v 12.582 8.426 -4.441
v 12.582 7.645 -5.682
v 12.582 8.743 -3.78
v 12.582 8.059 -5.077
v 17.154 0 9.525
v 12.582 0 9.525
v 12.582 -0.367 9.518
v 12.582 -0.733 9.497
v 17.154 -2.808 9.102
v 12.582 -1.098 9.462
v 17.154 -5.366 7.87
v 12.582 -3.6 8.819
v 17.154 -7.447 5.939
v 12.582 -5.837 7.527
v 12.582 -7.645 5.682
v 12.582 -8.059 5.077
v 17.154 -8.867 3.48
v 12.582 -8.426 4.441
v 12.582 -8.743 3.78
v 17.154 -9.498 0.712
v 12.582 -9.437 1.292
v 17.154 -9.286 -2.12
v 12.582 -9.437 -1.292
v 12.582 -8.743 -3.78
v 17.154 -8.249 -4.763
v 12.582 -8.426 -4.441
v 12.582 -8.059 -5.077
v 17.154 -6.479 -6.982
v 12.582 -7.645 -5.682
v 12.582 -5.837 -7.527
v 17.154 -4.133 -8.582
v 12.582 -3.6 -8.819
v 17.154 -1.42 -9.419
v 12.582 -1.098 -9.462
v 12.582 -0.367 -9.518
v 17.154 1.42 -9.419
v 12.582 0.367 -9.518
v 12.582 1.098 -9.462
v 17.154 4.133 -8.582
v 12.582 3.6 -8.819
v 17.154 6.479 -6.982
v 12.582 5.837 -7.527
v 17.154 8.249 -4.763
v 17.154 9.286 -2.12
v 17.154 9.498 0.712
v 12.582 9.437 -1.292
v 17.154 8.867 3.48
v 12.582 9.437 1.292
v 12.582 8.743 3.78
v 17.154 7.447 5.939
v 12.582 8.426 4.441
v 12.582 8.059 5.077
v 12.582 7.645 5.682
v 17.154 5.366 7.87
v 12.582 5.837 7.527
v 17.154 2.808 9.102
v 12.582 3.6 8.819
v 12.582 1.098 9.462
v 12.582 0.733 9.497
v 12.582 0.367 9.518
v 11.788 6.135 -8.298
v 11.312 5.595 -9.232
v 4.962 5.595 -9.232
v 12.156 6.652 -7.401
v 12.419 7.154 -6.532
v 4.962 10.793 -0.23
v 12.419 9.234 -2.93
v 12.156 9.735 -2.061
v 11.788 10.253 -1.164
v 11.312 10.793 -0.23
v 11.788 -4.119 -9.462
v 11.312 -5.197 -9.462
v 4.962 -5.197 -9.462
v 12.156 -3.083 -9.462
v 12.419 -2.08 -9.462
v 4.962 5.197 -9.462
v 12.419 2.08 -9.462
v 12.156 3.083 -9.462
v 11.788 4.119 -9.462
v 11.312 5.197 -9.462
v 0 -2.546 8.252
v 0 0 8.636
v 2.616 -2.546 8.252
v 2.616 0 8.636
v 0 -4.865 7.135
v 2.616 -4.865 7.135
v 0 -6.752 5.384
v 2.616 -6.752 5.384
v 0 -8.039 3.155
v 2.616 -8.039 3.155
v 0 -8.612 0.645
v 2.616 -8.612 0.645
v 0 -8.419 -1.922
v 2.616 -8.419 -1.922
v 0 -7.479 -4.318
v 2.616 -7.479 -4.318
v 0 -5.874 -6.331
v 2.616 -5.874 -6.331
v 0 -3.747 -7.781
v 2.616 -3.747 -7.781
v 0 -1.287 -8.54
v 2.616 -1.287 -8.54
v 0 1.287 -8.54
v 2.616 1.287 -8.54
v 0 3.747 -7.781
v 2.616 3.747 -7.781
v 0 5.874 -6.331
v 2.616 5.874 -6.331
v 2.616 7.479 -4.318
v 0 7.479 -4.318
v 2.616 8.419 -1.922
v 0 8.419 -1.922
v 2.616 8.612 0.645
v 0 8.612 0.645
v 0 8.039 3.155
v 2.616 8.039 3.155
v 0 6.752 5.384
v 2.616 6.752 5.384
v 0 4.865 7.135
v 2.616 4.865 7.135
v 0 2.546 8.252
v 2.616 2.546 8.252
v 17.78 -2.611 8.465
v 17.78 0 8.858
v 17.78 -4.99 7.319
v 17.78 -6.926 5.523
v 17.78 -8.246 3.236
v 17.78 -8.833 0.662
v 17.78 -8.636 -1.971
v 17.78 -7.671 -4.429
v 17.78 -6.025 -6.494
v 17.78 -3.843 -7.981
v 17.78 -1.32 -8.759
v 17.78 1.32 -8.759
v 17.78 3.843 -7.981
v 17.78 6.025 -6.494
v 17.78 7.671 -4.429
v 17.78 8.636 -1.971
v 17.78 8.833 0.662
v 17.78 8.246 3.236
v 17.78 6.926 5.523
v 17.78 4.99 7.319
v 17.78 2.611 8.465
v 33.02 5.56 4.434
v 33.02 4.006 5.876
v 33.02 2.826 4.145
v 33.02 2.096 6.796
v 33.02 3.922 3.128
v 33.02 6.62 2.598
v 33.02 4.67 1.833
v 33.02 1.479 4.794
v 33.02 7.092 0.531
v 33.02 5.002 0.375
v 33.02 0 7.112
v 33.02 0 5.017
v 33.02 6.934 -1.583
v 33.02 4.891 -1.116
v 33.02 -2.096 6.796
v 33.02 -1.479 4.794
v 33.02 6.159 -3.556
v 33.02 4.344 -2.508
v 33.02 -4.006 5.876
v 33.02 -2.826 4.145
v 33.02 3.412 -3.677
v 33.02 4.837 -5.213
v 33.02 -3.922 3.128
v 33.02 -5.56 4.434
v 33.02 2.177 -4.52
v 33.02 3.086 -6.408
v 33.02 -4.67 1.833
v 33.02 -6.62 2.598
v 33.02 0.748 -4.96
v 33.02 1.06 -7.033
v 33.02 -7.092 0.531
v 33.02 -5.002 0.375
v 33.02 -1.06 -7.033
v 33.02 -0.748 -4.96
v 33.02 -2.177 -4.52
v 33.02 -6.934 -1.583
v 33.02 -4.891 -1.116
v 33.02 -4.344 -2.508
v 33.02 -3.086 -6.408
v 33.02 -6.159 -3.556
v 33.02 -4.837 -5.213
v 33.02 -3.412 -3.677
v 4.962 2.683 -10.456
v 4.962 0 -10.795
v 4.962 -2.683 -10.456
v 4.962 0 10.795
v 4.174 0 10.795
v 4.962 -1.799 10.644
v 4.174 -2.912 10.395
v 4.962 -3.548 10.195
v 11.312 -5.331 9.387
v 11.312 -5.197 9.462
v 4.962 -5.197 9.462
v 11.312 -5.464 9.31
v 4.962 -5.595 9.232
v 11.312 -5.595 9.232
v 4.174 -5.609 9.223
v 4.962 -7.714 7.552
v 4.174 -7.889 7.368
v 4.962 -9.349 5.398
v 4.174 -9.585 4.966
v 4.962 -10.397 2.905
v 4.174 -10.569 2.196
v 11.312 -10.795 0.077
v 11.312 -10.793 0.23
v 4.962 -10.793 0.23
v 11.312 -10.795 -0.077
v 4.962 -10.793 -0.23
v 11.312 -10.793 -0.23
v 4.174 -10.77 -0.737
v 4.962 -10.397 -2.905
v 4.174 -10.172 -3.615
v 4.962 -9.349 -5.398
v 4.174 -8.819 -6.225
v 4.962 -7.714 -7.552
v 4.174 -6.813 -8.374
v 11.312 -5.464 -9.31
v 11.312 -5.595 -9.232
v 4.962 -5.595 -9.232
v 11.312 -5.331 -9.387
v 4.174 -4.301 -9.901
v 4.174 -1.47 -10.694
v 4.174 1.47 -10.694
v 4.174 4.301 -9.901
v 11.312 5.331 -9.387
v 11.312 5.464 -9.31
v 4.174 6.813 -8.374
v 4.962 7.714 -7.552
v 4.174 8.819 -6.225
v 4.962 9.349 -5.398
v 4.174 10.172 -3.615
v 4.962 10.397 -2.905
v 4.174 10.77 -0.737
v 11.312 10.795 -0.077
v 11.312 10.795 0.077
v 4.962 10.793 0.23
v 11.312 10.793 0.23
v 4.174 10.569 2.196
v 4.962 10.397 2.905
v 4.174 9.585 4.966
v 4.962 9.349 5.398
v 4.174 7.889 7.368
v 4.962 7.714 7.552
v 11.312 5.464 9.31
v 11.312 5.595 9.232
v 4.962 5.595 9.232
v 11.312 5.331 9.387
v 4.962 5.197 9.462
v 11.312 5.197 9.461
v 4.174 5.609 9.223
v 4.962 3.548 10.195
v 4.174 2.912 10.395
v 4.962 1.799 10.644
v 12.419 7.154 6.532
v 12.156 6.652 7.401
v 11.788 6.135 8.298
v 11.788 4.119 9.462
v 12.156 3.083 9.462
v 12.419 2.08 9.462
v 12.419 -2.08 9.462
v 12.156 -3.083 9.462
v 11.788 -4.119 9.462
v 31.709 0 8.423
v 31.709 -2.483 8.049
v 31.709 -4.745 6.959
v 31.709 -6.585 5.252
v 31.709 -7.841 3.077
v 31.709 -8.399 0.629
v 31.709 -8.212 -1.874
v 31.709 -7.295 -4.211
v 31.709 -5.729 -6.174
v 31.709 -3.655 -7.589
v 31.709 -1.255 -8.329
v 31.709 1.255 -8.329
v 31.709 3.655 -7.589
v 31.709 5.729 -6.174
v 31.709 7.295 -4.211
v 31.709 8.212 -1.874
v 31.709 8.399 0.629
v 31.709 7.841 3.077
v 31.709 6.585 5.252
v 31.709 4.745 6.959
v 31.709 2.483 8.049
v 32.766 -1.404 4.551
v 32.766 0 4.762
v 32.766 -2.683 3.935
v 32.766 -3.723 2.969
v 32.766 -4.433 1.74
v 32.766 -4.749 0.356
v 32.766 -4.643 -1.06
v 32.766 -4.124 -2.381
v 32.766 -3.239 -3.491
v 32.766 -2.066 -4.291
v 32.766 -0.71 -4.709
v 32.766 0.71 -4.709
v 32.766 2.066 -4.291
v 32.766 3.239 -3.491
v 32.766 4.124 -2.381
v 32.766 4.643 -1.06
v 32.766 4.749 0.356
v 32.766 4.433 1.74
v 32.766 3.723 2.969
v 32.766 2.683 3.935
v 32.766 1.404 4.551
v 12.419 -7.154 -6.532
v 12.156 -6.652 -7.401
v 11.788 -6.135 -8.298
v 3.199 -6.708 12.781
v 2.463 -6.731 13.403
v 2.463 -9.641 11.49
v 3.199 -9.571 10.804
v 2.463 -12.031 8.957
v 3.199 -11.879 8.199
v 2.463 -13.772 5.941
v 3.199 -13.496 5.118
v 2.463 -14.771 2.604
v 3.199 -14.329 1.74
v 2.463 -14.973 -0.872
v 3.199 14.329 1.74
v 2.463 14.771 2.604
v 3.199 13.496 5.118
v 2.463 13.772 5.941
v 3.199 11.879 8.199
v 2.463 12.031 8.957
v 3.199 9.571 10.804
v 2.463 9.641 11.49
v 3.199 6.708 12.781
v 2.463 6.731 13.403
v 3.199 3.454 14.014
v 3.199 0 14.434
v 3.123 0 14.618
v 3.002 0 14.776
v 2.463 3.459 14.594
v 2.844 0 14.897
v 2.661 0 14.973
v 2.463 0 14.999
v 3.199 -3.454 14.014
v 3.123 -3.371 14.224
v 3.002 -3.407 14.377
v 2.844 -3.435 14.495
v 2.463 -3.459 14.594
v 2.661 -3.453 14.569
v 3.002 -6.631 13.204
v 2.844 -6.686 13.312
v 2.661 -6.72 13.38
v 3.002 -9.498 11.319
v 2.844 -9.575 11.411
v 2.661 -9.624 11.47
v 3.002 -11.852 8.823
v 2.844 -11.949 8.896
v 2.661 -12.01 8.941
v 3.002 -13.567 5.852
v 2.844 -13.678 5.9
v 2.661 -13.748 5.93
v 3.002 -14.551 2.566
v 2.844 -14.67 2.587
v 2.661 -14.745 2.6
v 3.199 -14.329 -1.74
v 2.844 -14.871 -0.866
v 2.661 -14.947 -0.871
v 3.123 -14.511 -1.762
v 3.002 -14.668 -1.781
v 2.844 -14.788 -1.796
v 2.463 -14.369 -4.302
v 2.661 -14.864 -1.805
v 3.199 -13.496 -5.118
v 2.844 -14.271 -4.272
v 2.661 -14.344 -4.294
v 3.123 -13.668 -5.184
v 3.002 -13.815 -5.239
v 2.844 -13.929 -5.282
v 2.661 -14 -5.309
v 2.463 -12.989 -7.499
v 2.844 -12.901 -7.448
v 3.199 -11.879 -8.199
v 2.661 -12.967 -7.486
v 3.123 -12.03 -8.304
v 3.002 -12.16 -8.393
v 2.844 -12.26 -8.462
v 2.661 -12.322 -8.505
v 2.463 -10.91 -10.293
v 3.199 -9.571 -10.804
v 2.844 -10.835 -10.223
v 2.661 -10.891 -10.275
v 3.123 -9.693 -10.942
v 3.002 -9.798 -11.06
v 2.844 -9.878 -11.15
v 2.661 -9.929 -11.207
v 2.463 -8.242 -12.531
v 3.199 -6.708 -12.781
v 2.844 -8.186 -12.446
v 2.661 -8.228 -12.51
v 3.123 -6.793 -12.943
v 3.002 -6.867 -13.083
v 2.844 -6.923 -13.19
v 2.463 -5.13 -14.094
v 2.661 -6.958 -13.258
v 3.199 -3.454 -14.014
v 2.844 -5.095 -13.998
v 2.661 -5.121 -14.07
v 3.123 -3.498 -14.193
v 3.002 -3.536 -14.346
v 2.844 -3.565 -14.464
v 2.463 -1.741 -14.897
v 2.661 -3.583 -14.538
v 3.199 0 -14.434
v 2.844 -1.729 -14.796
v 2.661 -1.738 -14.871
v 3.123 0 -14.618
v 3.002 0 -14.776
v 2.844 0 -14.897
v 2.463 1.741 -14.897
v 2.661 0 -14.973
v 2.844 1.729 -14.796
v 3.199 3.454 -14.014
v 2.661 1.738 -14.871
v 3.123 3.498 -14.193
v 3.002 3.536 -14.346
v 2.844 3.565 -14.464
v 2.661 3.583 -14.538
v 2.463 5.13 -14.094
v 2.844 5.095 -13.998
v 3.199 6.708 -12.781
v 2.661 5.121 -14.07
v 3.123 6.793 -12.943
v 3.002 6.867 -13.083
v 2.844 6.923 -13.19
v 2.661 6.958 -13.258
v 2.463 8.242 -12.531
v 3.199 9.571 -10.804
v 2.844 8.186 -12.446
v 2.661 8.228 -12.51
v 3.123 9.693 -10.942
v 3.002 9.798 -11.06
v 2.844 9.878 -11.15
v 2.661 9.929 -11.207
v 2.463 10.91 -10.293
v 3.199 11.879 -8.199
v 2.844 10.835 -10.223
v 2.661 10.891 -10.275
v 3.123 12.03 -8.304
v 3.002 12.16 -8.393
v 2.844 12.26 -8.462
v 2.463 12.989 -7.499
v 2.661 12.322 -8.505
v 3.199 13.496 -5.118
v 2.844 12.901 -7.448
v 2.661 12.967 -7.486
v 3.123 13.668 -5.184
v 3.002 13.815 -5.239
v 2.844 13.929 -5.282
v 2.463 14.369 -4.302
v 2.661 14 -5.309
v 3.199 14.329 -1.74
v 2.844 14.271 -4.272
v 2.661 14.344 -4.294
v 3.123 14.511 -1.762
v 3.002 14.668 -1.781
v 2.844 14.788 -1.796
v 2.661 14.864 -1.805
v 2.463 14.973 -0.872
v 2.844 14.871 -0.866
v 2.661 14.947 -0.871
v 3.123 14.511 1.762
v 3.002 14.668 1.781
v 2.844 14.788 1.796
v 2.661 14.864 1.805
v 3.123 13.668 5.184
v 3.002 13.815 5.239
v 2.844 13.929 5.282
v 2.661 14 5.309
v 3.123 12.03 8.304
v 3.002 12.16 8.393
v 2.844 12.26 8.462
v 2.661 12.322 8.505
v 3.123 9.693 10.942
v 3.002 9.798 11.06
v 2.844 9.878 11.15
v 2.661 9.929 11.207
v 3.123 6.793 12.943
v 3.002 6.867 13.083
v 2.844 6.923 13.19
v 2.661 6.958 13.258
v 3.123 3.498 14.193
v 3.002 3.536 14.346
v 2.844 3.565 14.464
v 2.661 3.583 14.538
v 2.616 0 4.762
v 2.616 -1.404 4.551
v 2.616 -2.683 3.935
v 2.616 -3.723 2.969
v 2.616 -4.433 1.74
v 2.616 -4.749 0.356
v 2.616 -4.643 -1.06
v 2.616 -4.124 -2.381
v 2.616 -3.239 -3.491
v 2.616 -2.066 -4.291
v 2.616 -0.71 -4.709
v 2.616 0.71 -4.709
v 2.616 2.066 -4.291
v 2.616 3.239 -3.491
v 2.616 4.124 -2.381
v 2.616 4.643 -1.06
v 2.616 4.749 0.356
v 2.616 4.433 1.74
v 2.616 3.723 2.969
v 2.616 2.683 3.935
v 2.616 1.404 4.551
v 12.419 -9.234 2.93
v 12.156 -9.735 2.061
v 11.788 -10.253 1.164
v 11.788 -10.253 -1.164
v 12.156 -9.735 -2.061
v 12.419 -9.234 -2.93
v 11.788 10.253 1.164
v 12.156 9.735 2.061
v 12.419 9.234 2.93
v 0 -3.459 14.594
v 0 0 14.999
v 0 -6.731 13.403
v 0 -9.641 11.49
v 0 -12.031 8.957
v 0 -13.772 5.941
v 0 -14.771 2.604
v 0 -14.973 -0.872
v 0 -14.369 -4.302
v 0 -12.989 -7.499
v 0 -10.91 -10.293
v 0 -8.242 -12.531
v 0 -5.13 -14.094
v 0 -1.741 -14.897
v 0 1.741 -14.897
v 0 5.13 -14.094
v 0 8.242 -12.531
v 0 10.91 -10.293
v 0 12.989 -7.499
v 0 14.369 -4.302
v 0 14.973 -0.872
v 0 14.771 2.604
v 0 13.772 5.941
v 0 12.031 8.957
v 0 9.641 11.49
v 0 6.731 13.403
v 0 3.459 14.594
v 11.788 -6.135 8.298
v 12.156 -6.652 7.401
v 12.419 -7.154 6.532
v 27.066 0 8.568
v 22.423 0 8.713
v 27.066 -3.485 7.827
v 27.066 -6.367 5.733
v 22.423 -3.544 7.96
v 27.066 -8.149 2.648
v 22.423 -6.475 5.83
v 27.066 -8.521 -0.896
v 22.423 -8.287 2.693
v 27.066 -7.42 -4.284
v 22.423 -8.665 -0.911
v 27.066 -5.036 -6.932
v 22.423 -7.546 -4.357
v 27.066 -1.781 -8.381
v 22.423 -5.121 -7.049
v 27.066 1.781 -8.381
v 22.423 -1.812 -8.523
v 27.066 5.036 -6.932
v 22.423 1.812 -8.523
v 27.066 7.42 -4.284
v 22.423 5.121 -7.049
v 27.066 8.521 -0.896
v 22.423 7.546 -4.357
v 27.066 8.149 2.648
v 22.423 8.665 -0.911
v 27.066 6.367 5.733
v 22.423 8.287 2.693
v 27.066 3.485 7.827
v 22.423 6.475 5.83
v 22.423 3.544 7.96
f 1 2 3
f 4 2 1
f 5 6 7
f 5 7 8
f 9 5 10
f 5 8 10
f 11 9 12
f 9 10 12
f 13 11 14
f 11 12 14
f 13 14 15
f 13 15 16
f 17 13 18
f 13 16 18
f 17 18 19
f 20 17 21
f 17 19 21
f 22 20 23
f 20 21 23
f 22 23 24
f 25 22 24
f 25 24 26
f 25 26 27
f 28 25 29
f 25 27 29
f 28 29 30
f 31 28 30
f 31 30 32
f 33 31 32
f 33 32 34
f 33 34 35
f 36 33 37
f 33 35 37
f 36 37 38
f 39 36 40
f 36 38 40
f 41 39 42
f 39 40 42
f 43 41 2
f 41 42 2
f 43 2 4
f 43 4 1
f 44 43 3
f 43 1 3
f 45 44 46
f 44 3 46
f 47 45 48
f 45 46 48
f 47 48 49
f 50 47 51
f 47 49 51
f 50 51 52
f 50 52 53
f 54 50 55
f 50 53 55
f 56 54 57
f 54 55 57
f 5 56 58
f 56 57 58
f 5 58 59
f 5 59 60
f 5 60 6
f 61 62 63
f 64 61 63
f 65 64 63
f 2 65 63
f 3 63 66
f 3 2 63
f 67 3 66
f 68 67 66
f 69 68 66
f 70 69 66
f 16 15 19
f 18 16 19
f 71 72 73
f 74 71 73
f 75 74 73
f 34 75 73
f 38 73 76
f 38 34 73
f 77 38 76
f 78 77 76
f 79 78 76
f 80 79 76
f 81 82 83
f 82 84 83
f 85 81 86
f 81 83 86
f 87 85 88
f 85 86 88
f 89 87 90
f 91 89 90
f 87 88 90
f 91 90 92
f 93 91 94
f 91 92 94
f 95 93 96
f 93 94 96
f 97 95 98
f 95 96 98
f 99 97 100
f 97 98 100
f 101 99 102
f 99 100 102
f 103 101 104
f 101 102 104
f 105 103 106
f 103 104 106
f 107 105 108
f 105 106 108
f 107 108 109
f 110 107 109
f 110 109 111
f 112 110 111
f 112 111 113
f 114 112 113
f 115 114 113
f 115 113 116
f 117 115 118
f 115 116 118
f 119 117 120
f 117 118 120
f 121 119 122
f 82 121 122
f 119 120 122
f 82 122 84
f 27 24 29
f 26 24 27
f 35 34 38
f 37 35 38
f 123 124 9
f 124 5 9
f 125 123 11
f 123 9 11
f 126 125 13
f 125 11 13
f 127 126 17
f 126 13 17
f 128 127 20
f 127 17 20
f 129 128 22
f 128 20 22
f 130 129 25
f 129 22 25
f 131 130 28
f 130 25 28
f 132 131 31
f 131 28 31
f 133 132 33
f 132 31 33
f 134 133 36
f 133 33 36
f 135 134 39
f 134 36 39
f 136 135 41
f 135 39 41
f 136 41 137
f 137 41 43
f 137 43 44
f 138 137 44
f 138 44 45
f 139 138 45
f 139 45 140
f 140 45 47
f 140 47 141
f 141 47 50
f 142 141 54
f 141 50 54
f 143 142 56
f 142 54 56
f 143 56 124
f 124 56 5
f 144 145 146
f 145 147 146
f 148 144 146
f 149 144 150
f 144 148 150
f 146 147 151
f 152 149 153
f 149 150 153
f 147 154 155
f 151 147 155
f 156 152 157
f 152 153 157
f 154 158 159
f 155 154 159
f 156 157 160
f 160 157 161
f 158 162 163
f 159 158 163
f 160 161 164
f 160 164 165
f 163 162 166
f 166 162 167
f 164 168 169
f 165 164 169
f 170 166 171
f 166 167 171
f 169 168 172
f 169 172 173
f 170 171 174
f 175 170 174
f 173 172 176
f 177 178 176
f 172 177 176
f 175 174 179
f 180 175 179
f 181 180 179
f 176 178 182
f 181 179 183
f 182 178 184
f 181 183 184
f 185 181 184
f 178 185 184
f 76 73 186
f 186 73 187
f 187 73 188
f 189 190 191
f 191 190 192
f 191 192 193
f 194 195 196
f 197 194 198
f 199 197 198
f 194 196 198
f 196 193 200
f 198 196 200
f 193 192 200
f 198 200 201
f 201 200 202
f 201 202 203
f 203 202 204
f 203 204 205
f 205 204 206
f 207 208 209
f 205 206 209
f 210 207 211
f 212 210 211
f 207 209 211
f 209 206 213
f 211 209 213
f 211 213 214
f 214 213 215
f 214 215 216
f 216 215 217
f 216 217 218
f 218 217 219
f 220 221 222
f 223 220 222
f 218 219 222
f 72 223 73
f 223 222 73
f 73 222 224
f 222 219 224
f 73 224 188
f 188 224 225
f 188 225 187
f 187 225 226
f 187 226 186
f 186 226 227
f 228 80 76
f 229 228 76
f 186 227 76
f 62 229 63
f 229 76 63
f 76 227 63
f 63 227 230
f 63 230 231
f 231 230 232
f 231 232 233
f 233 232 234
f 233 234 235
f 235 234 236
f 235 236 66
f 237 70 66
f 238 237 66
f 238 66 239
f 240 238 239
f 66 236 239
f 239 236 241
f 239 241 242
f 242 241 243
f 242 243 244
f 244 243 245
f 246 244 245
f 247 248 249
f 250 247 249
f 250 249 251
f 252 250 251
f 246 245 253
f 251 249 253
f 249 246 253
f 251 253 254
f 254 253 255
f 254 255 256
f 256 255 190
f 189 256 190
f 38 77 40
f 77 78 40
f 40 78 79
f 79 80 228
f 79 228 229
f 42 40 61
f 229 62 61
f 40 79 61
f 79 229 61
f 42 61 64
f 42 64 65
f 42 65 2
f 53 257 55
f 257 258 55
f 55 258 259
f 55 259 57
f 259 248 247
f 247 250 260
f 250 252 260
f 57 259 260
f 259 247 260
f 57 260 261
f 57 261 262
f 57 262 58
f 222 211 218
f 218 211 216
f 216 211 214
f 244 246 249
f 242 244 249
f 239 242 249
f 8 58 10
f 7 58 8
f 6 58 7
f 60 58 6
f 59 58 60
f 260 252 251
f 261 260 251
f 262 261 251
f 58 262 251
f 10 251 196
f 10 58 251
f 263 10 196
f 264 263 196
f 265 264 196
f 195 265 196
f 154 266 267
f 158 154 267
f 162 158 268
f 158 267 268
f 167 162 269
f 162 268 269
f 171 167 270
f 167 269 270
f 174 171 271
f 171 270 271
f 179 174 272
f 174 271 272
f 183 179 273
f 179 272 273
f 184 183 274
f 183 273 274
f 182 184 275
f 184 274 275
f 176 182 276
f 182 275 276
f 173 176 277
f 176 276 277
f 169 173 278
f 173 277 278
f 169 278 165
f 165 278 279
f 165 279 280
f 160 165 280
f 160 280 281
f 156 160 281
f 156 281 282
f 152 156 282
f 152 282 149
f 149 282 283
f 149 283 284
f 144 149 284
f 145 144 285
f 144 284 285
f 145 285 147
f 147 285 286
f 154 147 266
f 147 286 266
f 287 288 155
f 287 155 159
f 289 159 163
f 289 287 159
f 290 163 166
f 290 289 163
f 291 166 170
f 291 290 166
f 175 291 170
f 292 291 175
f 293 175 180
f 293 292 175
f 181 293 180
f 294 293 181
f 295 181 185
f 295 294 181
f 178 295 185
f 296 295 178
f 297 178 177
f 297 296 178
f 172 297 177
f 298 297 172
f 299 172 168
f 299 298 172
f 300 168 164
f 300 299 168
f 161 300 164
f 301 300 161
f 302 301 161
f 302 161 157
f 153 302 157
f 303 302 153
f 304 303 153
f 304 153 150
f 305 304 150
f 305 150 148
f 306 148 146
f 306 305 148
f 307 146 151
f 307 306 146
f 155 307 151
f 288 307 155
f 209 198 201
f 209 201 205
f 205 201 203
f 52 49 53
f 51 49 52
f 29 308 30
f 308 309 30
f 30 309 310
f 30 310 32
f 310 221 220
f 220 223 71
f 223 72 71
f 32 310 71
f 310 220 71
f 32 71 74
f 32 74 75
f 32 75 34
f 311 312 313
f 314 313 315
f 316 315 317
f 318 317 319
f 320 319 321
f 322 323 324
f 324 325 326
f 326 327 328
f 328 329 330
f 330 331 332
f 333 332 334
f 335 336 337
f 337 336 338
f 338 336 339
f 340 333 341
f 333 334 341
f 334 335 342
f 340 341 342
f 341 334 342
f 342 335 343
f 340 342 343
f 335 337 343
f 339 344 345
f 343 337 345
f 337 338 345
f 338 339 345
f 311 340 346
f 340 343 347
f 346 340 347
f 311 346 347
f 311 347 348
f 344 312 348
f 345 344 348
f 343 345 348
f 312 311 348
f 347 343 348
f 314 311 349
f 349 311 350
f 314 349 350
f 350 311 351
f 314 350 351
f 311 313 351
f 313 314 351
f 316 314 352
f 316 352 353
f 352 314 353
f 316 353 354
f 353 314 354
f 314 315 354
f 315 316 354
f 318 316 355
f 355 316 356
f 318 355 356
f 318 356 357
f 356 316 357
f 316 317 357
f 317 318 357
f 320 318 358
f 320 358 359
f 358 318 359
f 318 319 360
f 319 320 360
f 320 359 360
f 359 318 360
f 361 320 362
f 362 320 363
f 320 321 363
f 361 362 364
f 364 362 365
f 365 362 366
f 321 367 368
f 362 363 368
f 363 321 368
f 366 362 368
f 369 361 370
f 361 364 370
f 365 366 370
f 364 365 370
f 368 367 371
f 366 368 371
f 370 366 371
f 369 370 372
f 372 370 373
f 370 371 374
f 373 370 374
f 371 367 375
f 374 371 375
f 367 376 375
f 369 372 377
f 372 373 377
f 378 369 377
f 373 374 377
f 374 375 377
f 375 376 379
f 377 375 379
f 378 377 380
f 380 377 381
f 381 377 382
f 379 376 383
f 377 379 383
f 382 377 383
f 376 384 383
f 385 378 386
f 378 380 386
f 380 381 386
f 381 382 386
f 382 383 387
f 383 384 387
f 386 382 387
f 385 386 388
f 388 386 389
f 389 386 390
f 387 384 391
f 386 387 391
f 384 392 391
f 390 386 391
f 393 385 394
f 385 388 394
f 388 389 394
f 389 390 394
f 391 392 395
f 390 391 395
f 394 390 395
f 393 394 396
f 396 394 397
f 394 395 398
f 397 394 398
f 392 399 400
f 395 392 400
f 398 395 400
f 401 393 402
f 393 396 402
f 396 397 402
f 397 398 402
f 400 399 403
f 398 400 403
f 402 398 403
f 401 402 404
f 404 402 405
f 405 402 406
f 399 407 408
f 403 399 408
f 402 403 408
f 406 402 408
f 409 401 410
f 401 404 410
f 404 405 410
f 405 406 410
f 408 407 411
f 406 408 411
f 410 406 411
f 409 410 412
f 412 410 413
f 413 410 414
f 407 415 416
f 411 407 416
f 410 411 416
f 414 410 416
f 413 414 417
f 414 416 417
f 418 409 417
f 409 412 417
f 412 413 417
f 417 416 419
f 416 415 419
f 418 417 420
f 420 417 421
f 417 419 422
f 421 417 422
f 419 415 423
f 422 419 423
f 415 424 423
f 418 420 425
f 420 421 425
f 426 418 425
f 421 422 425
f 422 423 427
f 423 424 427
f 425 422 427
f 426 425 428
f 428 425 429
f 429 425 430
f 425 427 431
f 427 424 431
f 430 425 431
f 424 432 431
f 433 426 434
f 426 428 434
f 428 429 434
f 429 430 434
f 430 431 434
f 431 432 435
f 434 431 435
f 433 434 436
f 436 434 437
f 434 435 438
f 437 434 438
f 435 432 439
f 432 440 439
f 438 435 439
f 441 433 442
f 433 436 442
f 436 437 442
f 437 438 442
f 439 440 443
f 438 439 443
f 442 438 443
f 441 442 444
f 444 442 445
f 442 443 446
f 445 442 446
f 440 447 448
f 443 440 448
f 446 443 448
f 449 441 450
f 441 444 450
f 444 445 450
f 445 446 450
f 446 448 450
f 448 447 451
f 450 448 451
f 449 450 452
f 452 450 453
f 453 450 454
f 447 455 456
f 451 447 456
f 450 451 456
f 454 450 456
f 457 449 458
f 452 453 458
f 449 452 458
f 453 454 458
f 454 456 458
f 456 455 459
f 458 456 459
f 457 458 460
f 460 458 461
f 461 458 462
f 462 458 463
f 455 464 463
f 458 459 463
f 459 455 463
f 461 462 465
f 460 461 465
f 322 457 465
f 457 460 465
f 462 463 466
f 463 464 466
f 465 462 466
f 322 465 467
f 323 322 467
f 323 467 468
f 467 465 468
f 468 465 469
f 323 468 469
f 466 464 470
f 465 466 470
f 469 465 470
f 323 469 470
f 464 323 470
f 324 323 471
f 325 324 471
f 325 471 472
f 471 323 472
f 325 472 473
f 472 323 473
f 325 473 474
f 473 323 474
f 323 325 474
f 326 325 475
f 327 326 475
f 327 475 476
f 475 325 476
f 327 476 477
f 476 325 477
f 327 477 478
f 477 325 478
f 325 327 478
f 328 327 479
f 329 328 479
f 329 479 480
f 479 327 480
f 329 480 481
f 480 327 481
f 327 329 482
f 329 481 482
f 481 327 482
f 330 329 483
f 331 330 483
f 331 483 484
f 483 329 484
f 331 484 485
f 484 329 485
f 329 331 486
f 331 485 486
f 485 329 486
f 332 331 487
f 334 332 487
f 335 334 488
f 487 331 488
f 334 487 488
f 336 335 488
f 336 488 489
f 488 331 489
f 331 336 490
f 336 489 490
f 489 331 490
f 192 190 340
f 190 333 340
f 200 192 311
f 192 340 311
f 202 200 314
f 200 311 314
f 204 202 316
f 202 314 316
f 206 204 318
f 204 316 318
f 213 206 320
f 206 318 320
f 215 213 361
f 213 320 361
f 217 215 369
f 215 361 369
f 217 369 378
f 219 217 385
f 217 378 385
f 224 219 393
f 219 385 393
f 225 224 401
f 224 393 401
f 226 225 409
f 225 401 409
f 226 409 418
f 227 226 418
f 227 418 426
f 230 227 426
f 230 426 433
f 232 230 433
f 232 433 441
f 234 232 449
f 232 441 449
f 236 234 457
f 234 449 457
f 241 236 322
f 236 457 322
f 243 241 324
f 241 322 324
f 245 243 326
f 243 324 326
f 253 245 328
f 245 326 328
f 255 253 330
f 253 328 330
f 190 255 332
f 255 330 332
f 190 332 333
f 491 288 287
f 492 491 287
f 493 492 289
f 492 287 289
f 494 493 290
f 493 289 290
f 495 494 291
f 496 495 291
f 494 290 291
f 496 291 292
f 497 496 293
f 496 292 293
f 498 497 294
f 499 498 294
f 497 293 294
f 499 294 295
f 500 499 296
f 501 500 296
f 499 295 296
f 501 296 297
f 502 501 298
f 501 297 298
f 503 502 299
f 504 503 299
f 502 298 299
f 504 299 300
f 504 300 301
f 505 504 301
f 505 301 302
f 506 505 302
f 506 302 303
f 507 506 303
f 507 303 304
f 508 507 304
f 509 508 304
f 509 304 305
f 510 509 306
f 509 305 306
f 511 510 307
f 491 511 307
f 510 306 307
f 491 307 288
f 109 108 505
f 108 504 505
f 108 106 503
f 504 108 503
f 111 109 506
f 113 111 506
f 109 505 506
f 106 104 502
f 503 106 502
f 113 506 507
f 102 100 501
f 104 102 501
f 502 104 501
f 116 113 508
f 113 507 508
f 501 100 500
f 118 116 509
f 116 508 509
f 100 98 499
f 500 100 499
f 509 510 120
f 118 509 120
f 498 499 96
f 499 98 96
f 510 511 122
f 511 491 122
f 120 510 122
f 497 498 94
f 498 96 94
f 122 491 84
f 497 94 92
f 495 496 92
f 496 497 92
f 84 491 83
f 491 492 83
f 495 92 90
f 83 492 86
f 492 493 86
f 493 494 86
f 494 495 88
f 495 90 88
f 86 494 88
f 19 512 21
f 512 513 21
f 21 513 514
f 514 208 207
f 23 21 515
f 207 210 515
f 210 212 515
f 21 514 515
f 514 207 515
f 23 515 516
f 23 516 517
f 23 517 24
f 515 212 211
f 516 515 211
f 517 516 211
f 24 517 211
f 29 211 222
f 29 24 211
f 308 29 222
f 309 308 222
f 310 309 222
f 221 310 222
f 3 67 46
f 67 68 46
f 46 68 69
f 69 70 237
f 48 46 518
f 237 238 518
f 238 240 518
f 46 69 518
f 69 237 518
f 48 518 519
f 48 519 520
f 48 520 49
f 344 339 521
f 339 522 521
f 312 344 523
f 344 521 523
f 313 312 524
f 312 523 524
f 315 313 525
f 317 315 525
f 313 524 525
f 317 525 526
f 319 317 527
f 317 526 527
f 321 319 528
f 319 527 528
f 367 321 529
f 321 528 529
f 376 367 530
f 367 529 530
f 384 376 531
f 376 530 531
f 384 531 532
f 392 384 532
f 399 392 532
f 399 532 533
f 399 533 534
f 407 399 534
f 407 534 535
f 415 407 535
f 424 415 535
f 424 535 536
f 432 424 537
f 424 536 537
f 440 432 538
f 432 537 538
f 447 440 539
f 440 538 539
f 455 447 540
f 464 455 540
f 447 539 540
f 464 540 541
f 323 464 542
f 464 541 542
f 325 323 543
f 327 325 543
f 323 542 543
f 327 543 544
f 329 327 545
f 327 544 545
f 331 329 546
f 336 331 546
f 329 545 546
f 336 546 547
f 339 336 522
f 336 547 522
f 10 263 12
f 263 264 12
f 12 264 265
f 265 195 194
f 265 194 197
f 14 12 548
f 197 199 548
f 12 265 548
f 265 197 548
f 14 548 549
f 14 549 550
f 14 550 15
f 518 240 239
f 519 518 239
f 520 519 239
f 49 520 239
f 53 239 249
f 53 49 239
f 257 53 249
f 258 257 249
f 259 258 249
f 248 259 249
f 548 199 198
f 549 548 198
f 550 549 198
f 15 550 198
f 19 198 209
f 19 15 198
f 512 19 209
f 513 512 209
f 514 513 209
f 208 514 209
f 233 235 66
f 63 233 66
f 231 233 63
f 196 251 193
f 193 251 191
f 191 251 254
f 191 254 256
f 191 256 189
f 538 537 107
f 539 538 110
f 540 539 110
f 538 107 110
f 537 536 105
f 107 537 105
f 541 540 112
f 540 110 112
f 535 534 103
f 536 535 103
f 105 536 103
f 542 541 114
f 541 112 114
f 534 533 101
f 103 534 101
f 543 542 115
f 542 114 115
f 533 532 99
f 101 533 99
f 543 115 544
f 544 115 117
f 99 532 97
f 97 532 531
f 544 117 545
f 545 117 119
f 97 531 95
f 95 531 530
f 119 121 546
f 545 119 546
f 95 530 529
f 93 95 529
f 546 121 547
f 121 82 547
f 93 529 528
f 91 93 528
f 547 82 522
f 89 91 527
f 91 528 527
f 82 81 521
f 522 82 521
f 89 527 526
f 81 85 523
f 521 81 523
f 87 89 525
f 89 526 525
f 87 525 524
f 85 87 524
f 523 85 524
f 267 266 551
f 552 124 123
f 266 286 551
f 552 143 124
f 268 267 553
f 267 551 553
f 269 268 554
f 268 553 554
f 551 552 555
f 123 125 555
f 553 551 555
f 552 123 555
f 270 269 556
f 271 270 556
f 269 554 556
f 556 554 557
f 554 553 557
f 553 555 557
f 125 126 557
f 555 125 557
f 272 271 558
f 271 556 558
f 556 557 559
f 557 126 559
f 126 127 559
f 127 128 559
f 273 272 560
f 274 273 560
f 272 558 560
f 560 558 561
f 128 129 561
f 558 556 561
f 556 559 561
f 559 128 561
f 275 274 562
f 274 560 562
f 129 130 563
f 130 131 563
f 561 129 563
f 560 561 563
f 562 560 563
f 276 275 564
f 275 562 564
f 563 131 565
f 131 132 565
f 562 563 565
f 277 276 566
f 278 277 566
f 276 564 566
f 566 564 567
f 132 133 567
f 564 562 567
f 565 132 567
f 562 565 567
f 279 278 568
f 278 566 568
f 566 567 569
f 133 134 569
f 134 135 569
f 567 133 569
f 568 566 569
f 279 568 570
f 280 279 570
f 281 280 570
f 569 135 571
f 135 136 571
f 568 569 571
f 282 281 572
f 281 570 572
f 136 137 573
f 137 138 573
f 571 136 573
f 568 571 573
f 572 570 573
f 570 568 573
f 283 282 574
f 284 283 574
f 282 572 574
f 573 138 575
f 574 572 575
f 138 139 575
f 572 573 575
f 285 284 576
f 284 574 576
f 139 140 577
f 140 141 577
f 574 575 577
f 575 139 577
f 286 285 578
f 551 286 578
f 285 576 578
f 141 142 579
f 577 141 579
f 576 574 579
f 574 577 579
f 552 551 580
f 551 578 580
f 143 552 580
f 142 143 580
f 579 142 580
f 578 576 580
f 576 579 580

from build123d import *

# Parameters (mm, degrees)
CHAMFER2_SIZE      = 1.27
CHAMFER2_SIZE2     = 1.311607448
SKETCH13_OUTSIDE_W = 42.75
SKETCH13_OUTSIDE_H = 42.75
CUT_EXTRUDE3_DEPTH = 7.62
CHAMFER3_SIZE      = 0.254


with BuildPart() as part:
    # Sketch1 → Revolve1 (revolve)
    with BuildSketch(Plane.XY, mode=Mode.PRIVATE) as revolve1_sk:
        with BuildLine():
            Line((2.463296835, 14.9987), (0, 14.9987))
            Line((0, 14.9987), (0, 8.636))
            Line((0, 8.636), (2.6162, 8.636))
            Line((2.6162, 8.636), (2.6162, 4.7625))
            Line((2.6162, 4.7625), (33.02, 4.7625))
            Line((33.02, 4.7625), (33.02, 8.382))
            Line((33.02, 8.382), (17.78, 8.858247176))
            Line((17.78, 8.858247176), (17.153656205, 9.525))
            Line((17.153656205, 9.525), (12.581656205, 9.525))
            Line((12.581656205, 9.525), (11.311656205, 10.795))
            Line((11.311656205, 10.795), (4.17437802, 10.795))
            Line((4.17437802, 10.795), (3.199332315, 14.433920112))
            ThreePointArc((3.199332315, 14.433920112), (2.927173044, 14.841235245), (2.463296835, 14.9987))
        make_face()
    revolve(revolve1_sk.sketch.rotate(Axis((0, 0, 0), (1, 0, 0)), 90), axis=Axis((0, 0, 0), (1, 0, 0)))

    # Chamfer2
    chamfer2_edges = [part.edges().sort_by_distance(p)[0] for p in [
        (33.02, 0, -8.382),
    ]]
    chamfer2_side = [part.faces().sort_by_distance(p)[0] for p in [
        (33.02, 0, -4.999578762),
    ]]
    chamfer(chamfer2_edges, length=CHAMFER2_SIZE, length2=CHAMFER2_SIZE2, reference=chamfer2_side[0])

    # Sketch13 outside → Cut-Extrude3 (cut)
    with BuildSketch(Plane(origin=(12.581656205, 0, 0), x_dir=(0, 0, -1), z_dir=(1, 0, 0))):
        Rectangle(SKETCH13_OUTSIDE_W, SKETCH13_OUTSIDE_H)
        Polygon((0, 10.925199144), (-9.4615, 5.462599572), (-9.4615, -5.462599572), (0, -10.925199144), (9.4615, -5.462599572), (9.4615, 5.462599572), align=None, mode=Mode.SUBTRACT)
    extrude(amount=-CUT_EXTRUDE3_DEPTH, mode=Mode.SUBTRACT)

    # Chamfer3
    chamfer3_edges = [part.edges().sort_by_distance(p)[0] for p in [
        (33.02, 0, -4.7625),
    ]]
    chamfer(chamfer3_edges, length=CHAMFER3_SIZE)


solid = part.part
